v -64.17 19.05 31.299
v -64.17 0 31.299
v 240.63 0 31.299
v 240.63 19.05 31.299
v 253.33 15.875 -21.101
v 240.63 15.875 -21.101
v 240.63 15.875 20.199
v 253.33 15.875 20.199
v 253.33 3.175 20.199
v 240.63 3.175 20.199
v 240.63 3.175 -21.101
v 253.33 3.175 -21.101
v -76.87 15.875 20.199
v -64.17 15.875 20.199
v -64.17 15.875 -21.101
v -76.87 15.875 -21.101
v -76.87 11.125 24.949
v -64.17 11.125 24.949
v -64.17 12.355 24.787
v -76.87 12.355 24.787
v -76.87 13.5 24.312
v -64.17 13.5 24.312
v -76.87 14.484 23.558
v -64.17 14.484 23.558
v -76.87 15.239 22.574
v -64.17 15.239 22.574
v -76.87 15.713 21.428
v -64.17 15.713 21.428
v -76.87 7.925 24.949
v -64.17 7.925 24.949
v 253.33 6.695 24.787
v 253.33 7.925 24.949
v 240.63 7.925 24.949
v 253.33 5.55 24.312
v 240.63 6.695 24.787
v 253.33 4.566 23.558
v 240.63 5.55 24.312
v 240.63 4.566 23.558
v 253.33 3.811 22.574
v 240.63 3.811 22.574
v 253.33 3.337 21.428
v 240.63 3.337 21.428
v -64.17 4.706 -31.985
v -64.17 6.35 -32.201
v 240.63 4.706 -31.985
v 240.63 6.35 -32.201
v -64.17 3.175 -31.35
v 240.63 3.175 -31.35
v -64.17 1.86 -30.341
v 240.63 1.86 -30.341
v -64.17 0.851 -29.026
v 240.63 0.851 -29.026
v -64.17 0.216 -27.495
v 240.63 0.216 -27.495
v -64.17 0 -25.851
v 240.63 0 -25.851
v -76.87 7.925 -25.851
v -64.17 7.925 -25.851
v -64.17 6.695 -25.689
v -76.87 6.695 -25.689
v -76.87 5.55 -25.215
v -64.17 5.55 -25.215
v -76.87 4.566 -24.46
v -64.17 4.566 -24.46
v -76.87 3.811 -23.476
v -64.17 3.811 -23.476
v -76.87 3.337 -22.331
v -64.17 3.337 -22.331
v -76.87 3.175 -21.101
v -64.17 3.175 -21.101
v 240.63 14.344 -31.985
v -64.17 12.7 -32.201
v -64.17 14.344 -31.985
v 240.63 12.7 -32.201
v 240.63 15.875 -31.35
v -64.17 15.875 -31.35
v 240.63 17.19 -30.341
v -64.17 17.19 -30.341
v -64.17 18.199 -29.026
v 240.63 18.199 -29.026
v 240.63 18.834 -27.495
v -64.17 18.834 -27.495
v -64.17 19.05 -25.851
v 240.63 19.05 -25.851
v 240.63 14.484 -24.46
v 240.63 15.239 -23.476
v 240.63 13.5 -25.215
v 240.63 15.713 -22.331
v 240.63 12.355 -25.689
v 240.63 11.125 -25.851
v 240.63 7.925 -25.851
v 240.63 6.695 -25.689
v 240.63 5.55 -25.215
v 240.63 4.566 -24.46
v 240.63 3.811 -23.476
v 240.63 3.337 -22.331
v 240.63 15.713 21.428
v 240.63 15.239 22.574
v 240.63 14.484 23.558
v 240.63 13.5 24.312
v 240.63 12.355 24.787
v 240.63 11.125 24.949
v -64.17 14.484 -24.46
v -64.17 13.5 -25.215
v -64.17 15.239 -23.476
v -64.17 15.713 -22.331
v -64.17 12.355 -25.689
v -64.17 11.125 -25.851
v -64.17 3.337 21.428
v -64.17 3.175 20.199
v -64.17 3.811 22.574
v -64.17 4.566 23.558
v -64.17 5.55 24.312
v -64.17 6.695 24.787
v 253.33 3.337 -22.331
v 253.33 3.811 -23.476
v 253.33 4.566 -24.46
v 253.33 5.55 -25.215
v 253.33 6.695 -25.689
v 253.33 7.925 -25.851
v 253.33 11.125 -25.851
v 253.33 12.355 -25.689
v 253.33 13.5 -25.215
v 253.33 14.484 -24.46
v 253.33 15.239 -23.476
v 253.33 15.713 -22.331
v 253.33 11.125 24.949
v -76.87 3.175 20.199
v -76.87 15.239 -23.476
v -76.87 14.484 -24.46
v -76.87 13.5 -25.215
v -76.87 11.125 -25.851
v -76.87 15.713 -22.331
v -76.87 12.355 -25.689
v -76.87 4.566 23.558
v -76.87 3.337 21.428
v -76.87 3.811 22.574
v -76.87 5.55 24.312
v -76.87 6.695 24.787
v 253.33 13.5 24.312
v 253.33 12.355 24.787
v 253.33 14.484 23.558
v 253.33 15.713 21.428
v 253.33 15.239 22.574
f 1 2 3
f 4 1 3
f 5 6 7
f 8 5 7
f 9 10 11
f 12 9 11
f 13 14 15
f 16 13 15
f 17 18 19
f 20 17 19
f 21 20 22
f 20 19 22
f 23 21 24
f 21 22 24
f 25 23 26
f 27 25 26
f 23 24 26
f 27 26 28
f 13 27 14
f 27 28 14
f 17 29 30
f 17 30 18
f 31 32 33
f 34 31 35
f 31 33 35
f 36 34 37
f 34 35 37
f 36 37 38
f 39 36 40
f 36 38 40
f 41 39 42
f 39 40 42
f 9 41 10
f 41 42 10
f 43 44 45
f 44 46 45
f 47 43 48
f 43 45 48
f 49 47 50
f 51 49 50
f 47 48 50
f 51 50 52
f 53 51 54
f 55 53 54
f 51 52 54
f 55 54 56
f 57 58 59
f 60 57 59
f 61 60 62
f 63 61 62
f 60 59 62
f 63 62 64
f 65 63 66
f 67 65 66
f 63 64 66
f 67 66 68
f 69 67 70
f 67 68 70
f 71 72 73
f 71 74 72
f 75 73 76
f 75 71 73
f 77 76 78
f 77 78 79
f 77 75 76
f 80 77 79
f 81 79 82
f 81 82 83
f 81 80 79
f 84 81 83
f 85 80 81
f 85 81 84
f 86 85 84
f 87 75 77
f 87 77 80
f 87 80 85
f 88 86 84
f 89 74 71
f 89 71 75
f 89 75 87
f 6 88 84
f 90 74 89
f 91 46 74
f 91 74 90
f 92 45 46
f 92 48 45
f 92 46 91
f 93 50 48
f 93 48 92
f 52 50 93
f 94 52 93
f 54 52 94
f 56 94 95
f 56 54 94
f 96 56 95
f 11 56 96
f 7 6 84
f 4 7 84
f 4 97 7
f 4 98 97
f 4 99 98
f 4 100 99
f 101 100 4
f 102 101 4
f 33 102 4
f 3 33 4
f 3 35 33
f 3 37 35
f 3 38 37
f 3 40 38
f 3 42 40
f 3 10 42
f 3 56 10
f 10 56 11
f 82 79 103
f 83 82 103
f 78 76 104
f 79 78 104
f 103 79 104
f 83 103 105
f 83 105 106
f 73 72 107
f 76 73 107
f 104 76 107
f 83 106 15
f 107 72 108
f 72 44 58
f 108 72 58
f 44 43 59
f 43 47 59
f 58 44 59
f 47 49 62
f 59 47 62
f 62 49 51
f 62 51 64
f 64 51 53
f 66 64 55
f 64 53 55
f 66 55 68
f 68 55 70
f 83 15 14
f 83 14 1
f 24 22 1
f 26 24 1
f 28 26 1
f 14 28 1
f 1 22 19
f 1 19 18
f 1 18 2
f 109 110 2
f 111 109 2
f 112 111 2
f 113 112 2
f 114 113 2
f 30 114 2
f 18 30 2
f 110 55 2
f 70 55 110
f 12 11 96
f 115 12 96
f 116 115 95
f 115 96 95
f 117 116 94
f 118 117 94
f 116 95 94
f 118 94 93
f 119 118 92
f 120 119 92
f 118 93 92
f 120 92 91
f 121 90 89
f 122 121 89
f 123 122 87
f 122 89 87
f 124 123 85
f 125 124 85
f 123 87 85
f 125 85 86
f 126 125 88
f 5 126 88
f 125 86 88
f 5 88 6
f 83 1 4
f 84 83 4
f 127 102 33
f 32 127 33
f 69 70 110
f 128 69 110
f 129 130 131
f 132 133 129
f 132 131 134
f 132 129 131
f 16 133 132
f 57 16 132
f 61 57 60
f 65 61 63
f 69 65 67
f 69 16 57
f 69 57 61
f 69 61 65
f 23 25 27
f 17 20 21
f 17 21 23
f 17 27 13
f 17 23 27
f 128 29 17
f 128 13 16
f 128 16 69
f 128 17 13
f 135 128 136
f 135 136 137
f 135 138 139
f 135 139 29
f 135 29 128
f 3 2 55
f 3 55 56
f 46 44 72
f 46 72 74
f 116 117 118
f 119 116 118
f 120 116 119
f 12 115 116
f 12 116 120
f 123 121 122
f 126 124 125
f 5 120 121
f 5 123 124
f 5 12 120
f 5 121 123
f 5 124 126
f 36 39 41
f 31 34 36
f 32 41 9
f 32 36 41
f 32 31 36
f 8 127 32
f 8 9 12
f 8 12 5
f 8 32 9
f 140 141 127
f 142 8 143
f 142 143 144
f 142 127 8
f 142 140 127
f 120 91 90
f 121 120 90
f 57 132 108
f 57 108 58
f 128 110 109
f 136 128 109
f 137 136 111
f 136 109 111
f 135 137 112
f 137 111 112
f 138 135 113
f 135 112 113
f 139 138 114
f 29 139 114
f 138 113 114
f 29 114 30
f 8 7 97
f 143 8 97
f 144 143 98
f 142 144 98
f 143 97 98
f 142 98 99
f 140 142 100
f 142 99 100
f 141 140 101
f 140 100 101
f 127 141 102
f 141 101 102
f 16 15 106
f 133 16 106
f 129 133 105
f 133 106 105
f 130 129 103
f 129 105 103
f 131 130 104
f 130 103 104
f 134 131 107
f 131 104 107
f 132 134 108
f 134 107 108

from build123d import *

# Parameters (mm, degrees)
F0_W     = 304.8
F0_H     = 63.5
F1_DEPTH = 19.05
F3_DEPTH = 12.7
F5_DEPTH = 12.7
F6_R     = 6.35


with BuildPart() as f1:
    # F0 (on Front) → F1 (new body)
    with BuildSketch(Plane.XZ):
        with Locations((88.229522, -0.451185)):
            Rectangle(F0_W, F0_H)
    extrude(amount=-F1_DEPTH)

    # F2 (on face) → F3 (join)
    with BuildSketch(Plane.YZ.offset(240.629522)):
        with BuildLine():
            Line((11.1252, 24.948815), (7.9248, 24.948815))
            ThreePointArc((7.9248, 24.948815), (4.566184, 23.557631), (3.175, 20.199015))
            Line((3.175, 20.199015), (3.175, -21.101385))
            ThreePointArc((3.175, -21.101385), (4.566184, -24.460001), (7.9248, -25.851185))
            Line((7.9248, -25.851185), (11.1252, -25.851185))
            ThreePointArc((11.1252, -25.851185), (14.483816, -24.460001), (15.875, -21.101385))
            Line((15.875, -21.101385), (15.875, 20.199015))
            ThreePointArc((15.875, 20.199015), (14.483816, 23.557631), (11.1252, 24.948815))
        make_face()
    extrude(amount=F3_DEPTH)

    # F4 (on face) → F5 (join)
    with BuildSketch(Plane(origin=(-64.170478, 0, 0), x_dir=(0, -1, 0), z_dir=(-1, 0, 0))):
        with BuildLine():
            Line((-7.9248, 24.948815), (-11.1252, 24.948815))
            ThreePointArc((-11.1252, 24.948815), (-14.483816, 23.557631), (-15.875, 20.199015))
            Line((-15.875, 20.199015), (-15.875, -21.101385))
            ThreePointArc((-15.875, -21.101385), (-14.483816, -24.460001), (-11.1252, -25.851185))
            Line((-11.1252, -25.851185), (-7.9248, -25.851185))
            ThreePointArc((-7.9248, -25.851185), (-4.566184, -24.460001), (-3.175, -21.101385))
            Line((-3.175, -21.101385), (-3.175, 20.199015))
            ThreePointArc((-3.175, 20.199015), (-4.566184, 23.557631), (-7.9248, 24.948815))
        make_face()
    extrude(amount=F5_DEPTH)

    # F6
    f6_edges = [f1.edges().sort_by_distance(p)[0] for p in [
        (88.229522, 0, -32.201185),
        (88.229522, 19.05, -32.201185),
    ]]
    fillet(f6_edges, radius=F6_R)


solid = f1.part
